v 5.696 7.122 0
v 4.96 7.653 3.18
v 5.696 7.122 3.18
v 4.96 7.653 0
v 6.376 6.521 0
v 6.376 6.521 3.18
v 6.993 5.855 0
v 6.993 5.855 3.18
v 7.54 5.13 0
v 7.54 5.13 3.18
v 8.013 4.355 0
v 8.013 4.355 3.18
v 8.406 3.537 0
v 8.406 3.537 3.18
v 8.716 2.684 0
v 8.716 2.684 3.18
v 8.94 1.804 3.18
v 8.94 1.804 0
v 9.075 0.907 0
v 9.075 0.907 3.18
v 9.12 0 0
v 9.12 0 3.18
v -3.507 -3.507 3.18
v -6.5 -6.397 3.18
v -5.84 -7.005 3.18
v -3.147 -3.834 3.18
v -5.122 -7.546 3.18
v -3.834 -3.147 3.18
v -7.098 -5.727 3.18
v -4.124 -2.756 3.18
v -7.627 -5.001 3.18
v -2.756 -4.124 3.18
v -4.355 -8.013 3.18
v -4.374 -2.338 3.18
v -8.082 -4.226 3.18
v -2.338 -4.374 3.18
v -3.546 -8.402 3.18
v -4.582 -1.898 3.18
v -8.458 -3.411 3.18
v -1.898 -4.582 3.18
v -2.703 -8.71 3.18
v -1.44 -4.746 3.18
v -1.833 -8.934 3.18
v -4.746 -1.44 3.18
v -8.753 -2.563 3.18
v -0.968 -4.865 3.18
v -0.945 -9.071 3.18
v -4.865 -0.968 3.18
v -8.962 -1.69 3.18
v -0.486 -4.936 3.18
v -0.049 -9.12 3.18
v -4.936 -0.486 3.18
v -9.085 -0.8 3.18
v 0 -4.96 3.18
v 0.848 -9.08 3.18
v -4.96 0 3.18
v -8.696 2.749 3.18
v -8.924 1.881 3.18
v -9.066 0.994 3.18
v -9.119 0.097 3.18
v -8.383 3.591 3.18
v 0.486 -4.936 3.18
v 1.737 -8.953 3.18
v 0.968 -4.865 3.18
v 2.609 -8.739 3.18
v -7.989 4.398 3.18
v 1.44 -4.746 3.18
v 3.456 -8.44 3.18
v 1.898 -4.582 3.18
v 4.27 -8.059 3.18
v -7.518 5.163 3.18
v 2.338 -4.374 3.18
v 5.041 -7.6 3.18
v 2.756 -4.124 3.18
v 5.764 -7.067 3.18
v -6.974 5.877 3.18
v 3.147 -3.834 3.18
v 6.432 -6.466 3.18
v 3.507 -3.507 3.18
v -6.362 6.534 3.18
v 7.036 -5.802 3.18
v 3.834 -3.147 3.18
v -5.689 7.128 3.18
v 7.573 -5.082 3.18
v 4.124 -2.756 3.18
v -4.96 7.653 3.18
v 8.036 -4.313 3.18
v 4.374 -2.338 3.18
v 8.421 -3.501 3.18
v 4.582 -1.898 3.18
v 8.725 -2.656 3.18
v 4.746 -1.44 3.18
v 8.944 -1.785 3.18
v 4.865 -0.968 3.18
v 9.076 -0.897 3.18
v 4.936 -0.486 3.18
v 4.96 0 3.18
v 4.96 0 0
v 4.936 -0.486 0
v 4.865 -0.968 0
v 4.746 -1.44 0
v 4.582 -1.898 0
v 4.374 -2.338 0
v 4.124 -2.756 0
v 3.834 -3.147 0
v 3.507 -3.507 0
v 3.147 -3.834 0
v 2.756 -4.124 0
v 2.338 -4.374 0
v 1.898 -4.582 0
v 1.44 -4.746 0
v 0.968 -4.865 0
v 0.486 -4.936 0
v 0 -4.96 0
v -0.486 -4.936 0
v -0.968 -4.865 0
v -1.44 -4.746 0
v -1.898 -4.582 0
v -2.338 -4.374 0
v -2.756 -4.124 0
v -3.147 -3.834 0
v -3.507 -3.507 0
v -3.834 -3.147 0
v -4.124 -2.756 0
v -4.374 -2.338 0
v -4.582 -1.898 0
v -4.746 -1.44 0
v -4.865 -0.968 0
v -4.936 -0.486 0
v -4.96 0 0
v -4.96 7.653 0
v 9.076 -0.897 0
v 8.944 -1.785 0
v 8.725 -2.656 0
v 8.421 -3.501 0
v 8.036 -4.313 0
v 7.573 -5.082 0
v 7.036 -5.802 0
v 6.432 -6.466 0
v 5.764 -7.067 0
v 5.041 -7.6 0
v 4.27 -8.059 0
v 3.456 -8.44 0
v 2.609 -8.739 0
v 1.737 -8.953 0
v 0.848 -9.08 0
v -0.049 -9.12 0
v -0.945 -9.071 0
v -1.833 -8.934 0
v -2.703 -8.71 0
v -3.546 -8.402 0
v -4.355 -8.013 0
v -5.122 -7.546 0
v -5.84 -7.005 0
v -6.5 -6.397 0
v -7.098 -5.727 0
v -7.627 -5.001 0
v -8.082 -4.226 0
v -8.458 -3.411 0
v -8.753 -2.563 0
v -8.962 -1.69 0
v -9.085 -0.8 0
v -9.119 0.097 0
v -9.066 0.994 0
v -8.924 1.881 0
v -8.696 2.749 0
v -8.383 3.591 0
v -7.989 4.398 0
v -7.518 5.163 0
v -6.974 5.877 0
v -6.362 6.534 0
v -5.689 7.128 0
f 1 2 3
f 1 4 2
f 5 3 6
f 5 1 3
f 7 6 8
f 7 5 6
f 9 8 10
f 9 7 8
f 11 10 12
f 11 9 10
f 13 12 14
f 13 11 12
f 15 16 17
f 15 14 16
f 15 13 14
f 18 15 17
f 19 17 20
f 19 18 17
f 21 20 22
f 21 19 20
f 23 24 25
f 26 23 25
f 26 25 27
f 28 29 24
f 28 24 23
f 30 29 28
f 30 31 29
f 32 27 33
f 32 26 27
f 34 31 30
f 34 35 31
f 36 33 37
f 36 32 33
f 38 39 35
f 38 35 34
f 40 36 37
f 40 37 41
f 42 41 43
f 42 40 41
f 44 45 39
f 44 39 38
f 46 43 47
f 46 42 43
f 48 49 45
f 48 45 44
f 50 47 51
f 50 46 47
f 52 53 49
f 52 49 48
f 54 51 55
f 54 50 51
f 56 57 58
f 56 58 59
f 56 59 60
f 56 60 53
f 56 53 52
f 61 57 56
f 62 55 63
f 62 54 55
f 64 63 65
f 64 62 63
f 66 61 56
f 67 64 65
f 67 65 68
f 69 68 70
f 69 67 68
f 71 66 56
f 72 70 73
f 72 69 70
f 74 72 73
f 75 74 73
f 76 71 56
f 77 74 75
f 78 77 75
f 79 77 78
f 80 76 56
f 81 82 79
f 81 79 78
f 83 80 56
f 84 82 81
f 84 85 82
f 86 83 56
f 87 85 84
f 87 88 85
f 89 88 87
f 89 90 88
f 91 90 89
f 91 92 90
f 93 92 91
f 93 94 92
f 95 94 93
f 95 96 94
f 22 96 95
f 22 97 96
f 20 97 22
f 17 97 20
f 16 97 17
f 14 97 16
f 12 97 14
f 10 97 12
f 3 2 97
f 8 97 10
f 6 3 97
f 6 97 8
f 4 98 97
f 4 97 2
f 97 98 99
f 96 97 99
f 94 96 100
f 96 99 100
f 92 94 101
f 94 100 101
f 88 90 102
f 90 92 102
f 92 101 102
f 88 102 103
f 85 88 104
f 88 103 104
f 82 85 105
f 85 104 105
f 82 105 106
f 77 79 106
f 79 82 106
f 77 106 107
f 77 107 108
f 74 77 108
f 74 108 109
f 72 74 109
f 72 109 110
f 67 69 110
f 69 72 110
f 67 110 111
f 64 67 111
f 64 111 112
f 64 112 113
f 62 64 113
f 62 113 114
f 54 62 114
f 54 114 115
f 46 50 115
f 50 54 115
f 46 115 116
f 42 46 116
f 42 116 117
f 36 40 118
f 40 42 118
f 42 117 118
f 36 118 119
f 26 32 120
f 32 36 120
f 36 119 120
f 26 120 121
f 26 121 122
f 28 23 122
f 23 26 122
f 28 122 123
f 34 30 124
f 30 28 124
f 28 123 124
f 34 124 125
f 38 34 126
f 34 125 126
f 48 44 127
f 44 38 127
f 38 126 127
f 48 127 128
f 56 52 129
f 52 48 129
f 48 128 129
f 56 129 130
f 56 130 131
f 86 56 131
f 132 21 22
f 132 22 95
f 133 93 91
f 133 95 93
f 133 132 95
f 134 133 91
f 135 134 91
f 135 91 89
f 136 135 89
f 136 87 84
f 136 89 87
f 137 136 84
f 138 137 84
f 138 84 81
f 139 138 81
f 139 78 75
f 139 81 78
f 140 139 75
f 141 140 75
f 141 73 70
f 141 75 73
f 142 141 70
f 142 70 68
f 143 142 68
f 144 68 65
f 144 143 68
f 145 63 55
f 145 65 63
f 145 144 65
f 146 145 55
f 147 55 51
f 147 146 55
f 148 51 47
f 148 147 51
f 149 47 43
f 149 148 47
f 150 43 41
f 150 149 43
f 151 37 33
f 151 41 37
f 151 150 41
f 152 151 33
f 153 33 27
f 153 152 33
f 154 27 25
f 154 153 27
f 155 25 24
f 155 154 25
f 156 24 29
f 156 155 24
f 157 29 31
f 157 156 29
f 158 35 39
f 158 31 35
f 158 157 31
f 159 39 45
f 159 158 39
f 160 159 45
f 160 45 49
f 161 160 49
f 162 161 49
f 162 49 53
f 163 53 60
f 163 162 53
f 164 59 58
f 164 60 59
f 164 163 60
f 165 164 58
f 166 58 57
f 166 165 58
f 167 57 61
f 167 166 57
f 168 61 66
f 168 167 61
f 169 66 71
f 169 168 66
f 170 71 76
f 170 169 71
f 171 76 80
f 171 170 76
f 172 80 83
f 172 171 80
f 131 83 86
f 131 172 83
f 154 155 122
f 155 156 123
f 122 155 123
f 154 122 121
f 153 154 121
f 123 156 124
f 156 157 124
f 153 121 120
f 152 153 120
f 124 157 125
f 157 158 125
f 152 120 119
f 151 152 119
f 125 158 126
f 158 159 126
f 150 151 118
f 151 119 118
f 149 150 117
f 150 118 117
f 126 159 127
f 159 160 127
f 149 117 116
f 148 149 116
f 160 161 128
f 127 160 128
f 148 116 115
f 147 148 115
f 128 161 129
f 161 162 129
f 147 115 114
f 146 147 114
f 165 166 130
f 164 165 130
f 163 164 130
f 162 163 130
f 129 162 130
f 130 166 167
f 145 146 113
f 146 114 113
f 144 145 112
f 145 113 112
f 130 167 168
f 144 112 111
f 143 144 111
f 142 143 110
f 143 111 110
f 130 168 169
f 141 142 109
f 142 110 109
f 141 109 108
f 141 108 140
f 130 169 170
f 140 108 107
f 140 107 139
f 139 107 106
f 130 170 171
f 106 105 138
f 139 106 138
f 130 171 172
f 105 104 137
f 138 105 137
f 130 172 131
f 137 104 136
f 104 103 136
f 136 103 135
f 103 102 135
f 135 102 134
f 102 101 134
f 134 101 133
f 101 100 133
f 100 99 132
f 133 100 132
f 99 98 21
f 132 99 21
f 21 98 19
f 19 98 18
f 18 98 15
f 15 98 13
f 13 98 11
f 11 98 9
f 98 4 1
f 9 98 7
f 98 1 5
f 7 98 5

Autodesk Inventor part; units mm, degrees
ref_plane "YZ Plane" through (0, 0, 0) normal (1, 0, 0) x (0, 1, 0)
ref_plane "XZ Plane" through (0, 0, 0) normal (0, 1, 0) x (-1, 0, 0)
ref_plane "XY Plane" through (0, 0, 0) normal (0, 0, 1) x (1, 0, 0)
sketch "Sketch1" plane through (0, 0, 0) normal (0, 0, 1) x (1, 0, 0)
  circle A0 centre (0, 0) radius 4.96
  circle A1 centre (0, 0) radius 9.12
  line L0 (-4.96, 0) -> (-4.96, 7.6533)
  line L1 (4.96, 0) -> (4.96, 7.6533)
  dimension "d0" = 9.92
  dimension "d1" = 18.24
extrude "Extrusion1" add sketch "Sketch1" along normal blind 3.18 contours L1 A1 L0 A0 picked at (5.5376, 4.6162)
properties part number "parça6"
